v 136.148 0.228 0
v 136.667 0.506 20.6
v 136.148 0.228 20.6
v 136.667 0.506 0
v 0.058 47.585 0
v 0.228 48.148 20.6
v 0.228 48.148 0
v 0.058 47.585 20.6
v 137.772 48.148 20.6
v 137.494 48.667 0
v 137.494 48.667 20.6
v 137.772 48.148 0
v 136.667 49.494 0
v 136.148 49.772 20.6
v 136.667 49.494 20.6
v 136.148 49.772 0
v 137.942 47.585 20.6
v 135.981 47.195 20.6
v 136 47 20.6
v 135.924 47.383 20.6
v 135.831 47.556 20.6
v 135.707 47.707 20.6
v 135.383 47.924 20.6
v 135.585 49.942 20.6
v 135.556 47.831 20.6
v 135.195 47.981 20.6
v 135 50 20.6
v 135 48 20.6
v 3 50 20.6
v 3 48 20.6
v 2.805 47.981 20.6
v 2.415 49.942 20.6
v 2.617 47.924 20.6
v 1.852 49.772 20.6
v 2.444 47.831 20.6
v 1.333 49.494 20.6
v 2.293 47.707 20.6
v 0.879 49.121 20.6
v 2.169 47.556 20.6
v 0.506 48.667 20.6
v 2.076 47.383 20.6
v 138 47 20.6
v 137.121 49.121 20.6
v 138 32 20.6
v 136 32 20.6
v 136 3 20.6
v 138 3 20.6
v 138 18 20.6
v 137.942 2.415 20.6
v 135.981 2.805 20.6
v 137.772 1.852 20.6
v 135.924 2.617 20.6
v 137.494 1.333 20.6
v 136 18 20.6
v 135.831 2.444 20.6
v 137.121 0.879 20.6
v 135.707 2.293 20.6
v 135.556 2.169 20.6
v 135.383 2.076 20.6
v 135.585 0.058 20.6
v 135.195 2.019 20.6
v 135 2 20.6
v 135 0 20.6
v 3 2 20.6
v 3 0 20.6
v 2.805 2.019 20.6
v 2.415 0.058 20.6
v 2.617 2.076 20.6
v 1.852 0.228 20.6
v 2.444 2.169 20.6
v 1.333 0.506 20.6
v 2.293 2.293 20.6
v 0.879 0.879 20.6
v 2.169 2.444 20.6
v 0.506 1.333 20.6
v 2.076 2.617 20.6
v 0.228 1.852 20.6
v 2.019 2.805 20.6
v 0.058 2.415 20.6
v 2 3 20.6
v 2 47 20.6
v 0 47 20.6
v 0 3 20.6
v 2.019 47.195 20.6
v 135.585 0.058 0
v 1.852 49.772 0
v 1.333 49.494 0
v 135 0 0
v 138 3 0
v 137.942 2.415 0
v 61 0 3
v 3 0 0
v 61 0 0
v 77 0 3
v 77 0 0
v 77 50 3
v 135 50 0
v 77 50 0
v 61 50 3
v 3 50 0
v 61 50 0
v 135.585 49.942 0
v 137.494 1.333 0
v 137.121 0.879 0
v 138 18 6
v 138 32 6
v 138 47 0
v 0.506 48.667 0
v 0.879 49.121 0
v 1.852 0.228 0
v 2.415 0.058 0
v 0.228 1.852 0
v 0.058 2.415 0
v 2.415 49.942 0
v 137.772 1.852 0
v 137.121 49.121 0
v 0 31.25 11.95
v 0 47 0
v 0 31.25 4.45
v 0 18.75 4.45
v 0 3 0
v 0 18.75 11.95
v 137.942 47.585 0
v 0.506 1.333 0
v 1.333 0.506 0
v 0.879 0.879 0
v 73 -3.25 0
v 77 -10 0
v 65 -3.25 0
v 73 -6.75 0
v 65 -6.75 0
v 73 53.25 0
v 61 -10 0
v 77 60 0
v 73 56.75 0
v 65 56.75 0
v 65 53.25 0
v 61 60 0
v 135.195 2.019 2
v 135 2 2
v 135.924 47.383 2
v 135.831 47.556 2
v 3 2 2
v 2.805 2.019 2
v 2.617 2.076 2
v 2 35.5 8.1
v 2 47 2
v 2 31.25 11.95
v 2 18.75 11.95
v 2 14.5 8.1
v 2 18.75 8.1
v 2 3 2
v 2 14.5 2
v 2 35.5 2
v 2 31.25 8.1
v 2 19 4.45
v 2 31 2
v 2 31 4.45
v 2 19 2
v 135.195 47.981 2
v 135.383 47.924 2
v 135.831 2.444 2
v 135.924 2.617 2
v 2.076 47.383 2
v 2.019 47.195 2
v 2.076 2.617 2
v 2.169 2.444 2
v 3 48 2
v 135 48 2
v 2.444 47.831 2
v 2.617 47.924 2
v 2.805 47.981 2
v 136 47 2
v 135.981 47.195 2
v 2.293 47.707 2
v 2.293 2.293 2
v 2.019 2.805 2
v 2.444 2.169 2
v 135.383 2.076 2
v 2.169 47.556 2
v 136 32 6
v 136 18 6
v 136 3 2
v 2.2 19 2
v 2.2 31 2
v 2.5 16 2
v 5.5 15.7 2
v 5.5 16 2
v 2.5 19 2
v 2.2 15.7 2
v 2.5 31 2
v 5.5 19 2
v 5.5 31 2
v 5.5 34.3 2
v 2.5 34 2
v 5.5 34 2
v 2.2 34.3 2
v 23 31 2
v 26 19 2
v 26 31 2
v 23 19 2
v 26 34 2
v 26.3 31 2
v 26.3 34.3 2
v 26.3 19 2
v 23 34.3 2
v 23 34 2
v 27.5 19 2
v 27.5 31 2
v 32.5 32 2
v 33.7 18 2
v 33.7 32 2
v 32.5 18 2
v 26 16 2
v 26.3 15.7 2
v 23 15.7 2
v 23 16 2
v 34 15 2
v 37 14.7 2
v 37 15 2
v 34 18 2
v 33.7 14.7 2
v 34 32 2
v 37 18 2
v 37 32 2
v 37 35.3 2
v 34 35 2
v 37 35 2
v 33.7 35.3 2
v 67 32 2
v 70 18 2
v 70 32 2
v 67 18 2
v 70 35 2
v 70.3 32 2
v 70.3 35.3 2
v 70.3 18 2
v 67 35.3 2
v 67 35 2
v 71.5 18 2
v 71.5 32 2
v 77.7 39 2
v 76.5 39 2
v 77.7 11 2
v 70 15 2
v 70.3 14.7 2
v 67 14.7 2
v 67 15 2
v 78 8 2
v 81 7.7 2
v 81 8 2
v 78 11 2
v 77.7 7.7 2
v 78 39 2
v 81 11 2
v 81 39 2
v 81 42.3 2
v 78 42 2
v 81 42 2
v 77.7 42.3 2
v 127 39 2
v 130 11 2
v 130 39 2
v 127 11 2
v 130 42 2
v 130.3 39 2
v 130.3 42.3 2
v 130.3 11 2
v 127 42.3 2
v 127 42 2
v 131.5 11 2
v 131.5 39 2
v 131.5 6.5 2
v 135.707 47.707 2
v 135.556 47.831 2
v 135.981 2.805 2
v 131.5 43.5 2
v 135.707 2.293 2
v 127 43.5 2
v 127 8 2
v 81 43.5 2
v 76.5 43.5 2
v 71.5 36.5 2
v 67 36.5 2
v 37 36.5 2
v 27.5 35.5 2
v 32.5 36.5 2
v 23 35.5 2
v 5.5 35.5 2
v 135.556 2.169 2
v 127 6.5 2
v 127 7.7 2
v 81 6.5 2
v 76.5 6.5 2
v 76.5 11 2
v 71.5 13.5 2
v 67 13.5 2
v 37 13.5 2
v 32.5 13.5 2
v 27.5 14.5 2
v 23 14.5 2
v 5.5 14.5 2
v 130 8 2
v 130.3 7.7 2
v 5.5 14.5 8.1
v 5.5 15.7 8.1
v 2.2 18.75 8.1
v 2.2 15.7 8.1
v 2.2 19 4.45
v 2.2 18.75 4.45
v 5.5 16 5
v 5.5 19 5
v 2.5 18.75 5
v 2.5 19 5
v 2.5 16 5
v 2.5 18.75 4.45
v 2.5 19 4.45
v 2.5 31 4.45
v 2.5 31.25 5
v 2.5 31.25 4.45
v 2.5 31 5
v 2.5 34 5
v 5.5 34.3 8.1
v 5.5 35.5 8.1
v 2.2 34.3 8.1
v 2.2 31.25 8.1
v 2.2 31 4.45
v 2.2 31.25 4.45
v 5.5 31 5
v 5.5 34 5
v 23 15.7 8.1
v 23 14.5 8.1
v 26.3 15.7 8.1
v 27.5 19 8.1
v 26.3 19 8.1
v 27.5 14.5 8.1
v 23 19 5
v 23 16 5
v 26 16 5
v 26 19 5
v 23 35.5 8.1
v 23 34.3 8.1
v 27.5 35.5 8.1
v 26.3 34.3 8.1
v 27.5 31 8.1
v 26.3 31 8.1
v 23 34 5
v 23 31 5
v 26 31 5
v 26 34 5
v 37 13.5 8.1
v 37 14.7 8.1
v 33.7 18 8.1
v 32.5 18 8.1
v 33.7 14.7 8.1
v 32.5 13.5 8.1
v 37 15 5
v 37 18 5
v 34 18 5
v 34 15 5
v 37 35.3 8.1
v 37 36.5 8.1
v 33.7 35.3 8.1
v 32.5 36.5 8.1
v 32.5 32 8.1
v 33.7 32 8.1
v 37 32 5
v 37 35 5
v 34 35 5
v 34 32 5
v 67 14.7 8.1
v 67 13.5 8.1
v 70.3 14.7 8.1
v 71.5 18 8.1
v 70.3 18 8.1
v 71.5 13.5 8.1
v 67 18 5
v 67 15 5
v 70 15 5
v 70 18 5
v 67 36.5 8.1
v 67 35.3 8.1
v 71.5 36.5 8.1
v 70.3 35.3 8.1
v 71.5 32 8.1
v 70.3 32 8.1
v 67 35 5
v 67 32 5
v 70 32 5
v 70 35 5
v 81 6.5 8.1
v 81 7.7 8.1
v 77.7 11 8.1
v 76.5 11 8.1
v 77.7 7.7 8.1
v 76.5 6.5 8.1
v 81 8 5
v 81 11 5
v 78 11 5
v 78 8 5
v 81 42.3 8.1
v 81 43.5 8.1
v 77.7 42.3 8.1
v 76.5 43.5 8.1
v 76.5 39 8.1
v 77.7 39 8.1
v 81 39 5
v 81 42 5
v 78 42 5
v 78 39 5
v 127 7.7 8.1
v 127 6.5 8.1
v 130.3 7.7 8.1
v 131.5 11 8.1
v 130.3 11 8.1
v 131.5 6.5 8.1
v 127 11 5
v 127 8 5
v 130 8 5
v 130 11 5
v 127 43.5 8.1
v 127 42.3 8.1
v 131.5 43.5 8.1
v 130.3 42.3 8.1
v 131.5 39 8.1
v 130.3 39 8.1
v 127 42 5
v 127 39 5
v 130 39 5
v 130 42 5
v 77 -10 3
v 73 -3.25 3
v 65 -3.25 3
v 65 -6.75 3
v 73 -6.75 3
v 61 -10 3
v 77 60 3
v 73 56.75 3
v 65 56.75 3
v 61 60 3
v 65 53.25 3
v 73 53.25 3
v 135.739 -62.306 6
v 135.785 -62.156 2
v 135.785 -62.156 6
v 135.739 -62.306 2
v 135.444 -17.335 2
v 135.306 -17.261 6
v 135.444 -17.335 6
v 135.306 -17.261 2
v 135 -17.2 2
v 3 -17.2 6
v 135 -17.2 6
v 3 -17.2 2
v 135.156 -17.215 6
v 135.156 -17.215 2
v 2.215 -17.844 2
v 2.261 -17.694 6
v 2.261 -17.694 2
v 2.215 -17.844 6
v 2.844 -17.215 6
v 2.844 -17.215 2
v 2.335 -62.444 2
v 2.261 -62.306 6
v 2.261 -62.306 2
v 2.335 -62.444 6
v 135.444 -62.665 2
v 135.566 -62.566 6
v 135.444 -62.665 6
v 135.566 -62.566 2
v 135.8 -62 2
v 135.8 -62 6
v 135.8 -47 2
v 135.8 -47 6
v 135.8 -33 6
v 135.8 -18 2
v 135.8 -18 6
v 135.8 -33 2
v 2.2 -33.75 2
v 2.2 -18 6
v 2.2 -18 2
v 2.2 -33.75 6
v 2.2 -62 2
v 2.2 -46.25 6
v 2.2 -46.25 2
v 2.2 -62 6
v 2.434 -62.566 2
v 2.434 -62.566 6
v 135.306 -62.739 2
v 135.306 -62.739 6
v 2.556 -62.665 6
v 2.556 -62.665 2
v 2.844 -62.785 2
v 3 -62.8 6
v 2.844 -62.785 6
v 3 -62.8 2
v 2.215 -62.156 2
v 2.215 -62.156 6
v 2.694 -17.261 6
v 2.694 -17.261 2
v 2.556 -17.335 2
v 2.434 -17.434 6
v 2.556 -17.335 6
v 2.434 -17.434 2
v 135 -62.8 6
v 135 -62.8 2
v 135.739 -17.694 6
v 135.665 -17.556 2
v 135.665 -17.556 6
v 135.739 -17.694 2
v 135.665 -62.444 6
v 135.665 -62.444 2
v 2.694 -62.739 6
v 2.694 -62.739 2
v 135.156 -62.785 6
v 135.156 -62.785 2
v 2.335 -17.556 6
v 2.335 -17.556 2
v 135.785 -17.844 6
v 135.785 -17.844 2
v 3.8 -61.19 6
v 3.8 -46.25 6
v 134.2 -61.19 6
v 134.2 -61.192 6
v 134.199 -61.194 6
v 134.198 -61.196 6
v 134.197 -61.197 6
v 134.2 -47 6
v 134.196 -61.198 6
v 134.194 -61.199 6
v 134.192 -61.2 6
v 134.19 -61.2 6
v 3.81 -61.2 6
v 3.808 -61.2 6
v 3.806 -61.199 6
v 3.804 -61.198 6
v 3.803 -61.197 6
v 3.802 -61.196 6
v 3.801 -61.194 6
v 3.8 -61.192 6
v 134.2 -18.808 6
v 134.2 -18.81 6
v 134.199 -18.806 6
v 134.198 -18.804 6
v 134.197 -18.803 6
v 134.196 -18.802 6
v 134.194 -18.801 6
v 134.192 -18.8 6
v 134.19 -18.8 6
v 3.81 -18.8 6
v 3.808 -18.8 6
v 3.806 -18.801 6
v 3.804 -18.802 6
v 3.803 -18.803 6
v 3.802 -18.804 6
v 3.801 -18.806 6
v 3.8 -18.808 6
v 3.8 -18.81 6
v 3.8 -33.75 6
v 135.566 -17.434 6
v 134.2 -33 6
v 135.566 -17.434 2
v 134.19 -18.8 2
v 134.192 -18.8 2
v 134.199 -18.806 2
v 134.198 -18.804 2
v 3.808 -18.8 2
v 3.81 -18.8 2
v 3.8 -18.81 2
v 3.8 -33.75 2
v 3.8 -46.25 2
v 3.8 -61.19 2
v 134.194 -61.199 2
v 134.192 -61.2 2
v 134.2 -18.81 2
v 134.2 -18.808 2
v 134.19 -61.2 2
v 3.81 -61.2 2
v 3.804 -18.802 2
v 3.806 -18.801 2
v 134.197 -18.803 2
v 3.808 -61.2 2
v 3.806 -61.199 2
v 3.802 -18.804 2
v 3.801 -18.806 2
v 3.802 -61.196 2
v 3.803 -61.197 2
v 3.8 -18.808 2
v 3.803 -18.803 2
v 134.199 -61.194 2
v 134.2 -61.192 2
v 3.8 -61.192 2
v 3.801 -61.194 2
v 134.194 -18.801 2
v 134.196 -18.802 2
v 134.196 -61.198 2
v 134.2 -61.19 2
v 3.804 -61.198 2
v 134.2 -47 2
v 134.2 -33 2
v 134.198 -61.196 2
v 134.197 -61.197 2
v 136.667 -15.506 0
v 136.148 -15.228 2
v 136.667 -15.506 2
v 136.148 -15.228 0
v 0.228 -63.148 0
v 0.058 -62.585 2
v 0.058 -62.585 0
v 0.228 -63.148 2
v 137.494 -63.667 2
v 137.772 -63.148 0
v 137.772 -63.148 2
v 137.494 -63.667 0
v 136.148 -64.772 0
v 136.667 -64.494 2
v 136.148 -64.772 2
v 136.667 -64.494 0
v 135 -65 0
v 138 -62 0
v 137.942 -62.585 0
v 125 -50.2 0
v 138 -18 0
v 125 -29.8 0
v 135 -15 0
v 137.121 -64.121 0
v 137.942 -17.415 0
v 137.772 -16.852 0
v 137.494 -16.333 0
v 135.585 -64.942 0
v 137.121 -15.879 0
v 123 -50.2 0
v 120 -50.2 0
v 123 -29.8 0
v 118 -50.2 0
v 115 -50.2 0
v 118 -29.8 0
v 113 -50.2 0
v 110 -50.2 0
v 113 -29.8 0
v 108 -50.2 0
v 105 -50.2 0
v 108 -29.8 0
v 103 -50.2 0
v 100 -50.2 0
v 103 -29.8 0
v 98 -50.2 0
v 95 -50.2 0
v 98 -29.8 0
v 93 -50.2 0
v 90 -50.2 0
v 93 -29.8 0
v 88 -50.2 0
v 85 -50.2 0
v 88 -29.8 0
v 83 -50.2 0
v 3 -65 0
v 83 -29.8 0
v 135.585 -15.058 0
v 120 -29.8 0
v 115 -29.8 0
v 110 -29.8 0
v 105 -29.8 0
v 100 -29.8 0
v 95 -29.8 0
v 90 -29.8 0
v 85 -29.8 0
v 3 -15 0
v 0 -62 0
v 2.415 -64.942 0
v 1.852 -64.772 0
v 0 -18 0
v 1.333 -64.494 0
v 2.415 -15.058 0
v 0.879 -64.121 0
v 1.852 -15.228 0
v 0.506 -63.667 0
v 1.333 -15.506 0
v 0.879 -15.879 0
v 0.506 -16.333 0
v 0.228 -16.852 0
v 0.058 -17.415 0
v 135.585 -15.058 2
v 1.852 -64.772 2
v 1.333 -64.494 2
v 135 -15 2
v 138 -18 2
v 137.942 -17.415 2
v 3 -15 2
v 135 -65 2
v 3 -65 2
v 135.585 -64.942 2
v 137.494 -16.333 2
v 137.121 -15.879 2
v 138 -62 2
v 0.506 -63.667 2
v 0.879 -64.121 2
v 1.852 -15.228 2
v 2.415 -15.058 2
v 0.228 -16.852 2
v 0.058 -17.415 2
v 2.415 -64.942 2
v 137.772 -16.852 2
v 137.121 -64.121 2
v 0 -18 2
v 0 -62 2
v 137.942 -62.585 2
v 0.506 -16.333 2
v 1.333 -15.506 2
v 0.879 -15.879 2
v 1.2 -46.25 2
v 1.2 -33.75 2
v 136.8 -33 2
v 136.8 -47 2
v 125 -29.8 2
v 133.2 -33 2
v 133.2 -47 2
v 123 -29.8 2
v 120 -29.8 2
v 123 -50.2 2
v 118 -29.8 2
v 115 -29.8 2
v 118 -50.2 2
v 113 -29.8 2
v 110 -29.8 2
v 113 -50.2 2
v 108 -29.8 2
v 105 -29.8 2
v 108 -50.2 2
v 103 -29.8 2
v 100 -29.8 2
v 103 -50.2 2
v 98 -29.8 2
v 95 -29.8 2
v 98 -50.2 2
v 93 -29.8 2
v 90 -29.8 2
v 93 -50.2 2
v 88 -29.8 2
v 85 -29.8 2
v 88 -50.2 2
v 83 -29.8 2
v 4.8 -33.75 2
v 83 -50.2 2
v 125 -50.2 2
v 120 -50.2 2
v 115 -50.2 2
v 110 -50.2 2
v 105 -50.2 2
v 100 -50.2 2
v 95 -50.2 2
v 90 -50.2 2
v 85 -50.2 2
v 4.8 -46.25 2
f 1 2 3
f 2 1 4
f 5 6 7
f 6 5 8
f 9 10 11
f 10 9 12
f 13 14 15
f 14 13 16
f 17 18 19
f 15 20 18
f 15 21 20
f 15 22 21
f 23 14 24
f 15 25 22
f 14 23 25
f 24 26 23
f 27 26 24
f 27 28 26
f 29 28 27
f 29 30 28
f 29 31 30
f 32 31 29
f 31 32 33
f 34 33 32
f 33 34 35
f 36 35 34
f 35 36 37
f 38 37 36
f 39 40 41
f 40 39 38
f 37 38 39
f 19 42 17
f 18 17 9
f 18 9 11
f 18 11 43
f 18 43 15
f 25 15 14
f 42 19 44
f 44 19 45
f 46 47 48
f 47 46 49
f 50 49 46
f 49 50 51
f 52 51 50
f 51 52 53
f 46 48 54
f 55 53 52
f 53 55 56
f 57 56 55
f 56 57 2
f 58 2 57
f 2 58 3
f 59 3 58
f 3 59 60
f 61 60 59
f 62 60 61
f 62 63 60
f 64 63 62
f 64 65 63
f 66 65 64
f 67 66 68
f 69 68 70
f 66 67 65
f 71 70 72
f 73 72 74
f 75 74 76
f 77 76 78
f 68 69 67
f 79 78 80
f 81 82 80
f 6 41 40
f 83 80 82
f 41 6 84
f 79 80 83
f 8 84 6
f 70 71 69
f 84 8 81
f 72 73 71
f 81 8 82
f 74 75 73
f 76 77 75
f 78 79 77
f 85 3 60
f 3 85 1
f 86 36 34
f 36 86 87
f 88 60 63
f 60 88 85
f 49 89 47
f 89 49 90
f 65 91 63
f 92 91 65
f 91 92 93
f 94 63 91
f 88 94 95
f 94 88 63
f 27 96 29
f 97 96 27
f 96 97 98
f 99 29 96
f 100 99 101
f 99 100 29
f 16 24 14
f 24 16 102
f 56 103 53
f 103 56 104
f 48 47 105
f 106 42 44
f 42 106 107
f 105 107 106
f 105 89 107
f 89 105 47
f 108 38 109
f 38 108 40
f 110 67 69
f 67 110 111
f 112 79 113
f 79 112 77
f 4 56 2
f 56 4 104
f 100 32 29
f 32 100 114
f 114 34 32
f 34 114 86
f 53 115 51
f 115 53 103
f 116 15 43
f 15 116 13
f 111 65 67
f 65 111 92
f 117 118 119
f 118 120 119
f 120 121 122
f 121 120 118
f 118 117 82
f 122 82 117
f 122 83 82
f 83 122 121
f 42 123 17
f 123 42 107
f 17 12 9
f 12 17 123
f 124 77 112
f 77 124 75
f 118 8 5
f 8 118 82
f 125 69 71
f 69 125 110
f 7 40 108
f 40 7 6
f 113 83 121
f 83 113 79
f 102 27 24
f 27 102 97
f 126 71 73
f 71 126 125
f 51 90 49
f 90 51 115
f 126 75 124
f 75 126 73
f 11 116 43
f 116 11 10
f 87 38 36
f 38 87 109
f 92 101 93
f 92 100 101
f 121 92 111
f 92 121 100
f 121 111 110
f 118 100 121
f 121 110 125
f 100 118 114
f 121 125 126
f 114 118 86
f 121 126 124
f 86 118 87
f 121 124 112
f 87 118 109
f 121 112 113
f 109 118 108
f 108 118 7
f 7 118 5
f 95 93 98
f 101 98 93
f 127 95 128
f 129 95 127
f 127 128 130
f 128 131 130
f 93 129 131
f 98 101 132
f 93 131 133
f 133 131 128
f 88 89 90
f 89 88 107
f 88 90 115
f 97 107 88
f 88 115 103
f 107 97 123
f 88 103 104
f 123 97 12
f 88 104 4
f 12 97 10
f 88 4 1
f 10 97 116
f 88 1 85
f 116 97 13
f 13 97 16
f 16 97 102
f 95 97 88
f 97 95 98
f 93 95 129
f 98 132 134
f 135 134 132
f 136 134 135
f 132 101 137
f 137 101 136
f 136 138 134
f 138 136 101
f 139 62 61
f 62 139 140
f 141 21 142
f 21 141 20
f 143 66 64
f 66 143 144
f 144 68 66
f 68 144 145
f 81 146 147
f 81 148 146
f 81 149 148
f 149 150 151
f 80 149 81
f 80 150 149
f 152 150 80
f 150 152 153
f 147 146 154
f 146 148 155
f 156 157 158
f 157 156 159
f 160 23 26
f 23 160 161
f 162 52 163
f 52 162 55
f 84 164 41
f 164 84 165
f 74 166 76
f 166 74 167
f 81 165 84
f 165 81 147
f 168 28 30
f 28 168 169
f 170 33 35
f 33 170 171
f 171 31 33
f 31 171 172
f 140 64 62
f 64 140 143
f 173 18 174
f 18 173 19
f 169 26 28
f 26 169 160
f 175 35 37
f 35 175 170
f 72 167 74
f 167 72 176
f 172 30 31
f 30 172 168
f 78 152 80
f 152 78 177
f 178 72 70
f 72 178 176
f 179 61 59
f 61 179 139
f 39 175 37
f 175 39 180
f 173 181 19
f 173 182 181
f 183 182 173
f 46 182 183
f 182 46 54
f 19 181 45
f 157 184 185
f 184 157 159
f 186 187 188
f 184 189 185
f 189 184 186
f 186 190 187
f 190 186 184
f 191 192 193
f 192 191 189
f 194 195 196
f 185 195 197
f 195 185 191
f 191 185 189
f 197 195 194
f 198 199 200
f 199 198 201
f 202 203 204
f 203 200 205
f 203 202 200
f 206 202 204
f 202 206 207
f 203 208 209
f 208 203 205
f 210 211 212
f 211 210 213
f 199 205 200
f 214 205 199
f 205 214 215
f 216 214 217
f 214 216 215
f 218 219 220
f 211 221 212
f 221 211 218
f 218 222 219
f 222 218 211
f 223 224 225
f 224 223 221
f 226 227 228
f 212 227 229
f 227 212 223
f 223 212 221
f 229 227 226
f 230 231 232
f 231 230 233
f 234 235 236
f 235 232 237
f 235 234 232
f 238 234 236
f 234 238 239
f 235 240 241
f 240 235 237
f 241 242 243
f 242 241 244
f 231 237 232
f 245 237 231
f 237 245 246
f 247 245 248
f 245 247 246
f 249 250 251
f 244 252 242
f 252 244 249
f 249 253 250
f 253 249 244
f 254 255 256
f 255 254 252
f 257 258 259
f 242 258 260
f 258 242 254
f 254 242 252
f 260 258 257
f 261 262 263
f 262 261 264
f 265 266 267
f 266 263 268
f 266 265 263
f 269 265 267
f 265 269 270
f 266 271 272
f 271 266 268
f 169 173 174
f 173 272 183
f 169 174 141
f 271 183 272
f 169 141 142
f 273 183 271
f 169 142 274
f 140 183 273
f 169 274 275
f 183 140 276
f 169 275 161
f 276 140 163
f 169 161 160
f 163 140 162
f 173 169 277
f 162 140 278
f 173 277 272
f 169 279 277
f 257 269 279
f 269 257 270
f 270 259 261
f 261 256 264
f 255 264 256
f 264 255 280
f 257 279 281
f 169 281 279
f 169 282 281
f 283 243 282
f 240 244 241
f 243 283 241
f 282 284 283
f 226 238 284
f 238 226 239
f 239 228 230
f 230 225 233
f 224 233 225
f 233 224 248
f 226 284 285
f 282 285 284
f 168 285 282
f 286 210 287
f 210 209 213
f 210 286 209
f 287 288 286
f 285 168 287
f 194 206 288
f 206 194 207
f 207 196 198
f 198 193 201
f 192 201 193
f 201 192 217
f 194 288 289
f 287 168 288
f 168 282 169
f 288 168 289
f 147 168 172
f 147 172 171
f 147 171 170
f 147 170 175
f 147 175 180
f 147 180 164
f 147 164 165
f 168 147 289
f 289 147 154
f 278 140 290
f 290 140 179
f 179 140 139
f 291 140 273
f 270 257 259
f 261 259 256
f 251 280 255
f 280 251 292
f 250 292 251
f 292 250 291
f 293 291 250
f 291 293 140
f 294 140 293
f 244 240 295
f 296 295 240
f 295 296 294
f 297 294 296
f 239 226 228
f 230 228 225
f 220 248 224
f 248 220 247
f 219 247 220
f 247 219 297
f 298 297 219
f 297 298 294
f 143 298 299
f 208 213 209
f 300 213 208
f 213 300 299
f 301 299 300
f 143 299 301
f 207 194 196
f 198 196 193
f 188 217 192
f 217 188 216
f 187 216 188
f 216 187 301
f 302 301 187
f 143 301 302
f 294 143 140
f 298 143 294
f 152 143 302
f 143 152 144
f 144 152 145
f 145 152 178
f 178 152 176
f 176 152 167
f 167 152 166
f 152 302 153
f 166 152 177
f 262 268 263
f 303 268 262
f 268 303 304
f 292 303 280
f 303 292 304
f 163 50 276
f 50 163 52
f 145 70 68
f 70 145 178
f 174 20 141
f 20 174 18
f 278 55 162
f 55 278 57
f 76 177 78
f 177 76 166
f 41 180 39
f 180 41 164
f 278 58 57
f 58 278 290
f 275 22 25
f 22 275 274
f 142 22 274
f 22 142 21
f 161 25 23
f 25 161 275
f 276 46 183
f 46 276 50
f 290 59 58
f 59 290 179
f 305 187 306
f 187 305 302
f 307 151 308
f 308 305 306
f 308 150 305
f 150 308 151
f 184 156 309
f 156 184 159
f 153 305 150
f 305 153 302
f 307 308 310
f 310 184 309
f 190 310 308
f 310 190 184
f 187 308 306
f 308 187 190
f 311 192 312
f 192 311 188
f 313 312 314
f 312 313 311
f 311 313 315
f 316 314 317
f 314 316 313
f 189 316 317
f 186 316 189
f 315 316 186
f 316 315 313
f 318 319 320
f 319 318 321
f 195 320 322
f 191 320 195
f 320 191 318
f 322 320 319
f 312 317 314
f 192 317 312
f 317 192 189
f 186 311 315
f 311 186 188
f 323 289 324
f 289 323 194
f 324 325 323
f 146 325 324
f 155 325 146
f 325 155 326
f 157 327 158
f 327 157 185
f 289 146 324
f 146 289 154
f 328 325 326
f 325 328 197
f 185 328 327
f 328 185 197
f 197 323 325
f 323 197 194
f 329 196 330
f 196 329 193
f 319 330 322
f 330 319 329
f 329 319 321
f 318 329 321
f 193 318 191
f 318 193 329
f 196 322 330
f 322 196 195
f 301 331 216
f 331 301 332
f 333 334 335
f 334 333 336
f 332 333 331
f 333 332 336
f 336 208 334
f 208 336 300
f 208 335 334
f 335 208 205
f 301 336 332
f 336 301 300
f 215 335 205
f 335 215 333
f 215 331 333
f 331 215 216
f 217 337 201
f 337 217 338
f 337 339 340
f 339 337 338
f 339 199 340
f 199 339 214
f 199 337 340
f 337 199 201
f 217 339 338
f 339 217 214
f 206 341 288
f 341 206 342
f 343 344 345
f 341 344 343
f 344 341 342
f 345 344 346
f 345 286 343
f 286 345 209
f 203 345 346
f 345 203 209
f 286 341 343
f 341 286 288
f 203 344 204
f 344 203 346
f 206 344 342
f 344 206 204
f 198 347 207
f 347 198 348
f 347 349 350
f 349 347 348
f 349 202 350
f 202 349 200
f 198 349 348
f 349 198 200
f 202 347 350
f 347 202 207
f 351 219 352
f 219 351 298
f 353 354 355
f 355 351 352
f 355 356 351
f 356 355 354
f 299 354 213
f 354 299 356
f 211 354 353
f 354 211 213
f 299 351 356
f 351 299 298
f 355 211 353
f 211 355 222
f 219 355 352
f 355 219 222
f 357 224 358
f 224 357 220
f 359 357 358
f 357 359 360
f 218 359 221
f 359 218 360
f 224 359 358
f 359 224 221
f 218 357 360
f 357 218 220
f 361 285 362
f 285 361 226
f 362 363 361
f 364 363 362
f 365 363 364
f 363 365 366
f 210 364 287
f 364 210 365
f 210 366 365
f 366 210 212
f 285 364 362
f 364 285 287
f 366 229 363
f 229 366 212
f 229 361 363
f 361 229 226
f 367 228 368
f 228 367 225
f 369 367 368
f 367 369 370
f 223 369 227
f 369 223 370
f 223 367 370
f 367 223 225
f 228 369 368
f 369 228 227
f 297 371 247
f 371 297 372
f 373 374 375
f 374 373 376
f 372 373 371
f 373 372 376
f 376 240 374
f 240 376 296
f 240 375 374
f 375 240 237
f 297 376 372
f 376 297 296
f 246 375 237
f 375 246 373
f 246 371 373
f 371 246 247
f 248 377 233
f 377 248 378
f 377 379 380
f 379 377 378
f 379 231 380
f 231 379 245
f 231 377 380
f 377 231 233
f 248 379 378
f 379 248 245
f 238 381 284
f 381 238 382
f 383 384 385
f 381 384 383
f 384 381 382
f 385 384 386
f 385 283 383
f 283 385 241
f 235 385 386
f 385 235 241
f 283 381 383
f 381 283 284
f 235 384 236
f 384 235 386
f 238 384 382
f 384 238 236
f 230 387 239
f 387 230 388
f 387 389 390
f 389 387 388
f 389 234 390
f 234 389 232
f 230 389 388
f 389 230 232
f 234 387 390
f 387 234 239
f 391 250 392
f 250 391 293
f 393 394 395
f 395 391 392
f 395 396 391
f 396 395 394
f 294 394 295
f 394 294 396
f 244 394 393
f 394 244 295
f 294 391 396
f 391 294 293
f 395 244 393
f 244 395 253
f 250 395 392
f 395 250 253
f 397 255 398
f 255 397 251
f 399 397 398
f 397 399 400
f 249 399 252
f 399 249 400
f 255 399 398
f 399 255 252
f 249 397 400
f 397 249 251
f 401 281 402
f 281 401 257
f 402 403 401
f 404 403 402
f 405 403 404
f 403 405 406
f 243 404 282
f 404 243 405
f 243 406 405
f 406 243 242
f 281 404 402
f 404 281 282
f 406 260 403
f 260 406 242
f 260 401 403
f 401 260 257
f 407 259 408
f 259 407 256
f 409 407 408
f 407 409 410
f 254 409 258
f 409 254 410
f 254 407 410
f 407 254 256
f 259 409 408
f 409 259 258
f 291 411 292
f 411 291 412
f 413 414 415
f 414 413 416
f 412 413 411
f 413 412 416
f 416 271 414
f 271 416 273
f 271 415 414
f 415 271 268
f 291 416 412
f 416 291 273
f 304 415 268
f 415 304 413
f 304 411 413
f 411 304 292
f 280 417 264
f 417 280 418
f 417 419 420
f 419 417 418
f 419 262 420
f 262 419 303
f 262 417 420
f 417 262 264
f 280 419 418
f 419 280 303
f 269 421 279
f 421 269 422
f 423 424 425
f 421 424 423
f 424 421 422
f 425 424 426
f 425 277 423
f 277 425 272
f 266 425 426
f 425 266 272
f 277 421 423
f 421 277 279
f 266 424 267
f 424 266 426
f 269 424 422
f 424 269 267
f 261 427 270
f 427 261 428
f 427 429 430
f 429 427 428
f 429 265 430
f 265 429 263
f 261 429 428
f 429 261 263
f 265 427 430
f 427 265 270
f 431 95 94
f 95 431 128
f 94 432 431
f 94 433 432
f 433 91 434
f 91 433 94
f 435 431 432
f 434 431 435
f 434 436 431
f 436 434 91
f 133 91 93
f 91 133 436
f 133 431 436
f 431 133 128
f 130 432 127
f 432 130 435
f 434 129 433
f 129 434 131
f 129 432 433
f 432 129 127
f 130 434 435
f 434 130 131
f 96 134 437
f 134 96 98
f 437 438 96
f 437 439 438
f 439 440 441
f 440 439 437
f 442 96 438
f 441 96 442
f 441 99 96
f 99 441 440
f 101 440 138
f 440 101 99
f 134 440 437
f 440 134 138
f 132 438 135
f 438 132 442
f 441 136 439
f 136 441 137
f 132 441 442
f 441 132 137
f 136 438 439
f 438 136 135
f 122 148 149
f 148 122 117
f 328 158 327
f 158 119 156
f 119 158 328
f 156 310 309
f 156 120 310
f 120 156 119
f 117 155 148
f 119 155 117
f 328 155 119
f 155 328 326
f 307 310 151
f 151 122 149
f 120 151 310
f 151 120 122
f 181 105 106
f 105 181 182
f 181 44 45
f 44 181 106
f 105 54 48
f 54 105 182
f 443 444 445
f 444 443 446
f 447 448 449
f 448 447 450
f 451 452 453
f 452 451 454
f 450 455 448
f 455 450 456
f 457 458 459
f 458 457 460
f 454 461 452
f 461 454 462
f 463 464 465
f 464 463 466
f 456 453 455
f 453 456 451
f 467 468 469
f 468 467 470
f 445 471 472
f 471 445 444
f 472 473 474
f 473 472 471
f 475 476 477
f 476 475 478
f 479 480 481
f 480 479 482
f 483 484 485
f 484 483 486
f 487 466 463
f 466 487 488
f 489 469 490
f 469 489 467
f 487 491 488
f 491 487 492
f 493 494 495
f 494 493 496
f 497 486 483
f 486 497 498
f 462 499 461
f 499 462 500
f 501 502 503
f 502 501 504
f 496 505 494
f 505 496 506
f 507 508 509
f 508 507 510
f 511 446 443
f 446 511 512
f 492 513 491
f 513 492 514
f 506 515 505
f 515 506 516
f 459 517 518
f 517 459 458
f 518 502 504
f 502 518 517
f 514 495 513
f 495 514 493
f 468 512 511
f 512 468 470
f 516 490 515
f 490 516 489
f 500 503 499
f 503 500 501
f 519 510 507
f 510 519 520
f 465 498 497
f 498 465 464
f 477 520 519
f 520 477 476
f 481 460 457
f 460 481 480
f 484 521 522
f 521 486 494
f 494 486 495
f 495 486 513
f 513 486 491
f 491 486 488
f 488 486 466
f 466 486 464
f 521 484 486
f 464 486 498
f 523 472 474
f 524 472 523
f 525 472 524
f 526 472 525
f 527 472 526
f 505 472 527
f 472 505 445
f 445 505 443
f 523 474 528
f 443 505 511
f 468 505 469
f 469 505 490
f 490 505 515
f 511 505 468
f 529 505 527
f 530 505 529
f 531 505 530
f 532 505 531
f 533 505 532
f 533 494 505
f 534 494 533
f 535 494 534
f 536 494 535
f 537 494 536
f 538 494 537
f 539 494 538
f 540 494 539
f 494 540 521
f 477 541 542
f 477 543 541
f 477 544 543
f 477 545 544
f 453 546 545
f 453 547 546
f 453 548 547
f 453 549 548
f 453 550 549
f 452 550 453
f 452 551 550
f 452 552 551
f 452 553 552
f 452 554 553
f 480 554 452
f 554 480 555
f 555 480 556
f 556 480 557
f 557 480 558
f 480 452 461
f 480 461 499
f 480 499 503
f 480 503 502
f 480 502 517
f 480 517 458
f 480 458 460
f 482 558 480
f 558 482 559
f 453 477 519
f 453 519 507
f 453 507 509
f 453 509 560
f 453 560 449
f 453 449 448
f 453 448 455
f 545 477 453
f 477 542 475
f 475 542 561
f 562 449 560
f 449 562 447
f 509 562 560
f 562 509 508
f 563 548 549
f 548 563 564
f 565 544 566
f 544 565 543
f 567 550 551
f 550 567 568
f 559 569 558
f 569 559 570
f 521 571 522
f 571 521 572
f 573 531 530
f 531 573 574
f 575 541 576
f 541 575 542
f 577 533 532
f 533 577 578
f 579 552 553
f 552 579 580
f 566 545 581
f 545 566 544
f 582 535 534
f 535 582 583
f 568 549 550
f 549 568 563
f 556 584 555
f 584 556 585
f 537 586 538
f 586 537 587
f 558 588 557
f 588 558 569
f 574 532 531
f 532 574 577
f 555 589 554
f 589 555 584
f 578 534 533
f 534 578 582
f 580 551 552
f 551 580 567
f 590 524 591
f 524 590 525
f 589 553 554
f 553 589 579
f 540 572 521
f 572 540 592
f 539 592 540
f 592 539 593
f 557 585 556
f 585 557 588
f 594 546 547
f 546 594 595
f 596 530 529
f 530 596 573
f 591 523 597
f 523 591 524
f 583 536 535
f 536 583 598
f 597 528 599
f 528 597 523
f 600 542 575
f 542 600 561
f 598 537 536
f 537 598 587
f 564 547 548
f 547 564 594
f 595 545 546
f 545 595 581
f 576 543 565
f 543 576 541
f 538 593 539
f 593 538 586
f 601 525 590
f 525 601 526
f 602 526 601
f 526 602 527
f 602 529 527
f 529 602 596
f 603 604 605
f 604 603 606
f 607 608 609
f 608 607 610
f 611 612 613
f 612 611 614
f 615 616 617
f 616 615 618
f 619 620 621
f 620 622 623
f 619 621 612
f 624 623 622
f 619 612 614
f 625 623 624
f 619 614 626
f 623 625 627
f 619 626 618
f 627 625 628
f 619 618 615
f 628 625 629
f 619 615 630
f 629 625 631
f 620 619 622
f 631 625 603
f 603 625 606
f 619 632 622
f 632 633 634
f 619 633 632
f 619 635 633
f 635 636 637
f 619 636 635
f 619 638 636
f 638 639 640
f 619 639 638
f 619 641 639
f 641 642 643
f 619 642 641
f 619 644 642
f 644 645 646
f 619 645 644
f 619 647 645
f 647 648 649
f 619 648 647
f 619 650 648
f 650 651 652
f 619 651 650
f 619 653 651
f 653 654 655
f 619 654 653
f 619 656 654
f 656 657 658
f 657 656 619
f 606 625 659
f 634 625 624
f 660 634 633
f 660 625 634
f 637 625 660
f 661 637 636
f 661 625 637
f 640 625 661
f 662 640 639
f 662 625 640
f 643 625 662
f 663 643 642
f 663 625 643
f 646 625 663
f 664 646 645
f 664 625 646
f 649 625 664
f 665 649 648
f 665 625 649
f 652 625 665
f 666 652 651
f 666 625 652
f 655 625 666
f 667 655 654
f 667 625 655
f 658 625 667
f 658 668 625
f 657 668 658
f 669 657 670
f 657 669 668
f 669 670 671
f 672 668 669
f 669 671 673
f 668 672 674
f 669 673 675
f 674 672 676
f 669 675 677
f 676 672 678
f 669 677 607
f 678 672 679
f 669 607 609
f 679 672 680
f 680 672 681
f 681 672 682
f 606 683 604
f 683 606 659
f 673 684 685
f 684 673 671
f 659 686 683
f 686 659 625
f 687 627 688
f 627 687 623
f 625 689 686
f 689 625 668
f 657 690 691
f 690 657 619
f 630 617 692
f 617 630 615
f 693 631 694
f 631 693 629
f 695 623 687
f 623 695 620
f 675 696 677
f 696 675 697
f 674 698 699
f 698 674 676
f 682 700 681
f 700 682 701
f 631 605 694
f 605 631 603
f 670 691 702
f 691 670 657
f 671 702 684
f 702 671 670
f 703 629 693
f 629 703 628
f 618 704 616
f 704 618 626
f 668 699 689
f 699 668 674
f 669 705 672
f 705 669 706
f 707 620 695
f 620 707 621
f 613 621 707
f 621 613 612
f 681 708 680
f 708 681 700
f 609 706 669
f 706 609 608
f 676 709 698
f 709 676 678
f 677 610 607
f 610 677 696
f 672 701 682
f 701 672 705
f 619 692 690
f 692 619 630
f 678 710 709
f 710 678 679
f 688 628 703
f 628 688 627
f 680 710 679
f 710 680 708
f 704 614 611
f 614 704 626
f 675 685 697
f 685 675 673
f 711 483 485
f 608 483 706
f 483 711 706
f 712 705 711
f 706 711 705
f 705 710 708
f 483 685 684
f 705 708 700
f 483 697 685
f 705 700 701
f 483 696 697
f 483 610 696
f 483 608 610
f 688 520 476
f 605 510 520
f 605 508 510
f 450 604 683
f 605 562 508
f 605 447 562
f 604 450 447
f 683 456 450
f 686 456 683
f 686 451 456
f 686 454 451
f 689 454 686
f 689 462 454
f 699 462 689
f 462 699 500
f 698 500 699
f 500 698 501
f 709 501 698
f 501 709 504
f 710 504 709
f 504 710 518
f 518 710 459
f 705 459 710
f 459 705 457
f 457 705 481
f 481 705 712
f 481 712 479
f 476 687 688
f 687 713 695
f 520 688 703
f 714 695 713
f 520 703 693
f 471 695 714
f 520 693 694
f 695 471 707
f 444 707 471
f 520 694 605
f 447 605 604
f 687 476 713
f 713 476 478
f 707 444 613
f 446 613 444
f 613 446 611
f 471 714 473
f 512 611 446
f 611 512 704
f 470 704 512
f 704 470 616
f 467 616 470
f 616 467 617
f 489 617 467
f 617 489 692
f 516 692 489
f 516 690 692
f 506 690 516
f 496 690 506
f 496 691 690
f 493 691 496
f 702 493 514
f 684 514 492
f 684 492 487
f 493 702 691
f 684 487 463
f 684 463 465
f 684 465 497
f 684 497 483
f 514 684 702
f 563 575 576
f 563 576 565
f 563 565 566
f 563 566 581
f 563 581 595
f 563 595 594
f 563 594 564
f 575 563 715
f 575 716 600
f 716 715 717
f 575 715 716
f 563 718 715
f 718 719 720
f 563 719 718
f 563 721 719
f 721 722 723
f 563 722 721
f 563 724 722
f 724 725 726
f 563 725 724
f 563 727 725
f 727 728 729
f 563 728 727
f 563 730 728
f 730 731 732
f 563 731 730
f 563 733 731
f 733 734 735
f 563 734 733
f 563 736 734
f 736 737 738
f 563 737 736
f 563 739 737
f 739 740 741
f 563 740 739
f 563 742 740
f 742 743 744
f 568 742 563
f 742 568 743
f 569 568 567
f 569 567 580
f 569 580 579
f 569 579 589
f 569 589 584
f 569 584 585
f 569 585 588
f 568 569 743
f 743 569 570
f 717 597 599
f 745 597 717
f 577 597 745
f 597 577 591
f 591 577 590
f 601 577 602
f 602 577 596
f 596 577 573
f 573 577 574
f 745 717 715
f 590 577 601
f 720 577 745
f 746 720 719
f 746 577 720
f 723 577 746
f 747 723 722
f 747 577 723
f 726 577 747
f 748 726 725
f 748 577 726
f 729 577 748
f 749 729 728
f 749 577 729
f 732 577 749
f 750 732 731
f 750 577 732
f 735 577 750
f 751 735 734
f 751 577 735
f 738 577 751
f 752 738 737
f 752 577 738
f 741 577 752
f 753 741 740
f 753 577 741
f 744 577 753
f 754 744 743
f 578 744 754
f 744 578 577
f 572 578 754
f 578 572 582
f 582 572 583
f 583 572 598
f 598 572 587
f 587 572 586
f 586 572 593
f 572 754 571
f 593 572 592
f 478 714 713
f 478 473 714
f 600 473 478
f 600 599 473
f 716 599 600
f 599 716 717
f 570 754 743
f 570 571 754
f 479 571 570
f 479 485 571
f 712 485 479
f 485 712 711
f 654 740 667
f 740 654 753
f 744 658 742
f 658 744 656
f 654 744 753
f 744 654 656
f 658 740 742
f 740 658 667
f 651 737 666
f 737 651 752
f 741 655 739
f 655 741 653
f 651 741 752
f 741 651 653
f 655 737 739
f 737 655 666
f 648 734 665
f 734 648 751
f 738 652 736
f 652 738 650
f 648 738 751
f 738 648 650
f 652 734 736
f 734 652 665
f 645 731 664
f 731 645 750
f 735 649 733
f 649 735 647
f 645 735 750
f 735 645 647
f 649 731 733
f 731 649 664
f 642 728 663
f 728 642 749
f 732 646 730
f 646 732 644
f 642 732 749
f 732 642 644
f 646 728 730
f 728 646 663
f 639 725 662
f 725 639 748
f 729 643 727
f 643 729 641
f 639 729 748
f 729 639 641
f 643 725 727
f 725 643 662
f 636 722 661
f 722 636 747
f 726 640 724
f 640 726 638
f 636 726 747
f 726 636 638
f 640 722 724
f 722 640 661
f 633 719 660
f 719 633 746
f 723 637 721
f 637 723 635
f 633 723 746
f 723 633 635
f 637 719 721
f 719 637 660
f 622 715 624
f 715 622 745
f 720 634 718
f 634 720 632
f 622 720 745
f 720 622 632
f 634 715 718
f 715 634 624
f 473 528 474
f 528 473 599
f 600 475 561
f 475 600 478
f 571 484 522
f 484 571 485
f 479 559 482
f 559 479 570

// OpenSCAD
// Spark fan controller box
// Parametric enclosure for the hyudryu DGX-Spark-Fan-Shroud controller:
// RP2040-Zero + X9C103 module + Owltree PC039b USB-C PWM fan controller.
//
// Layout: the three boards sit in a row on corner locating brackets.
//   -X wall: RP2040-Zero USB-C opening (the one cable to the Spark)
//   +X wall: U-notch for the fan lead, open at the top so the plug drops in
//   lid:     friction-fit lip, vent slots over the Owltree boost converter
//   +/-Y:    zip-tie ears for strapping to the shroud leg or base
//
// Check every value marked MEASURE with calipers before printing.
// Units: mm. X runs along the row of boards, Y across, Z up.
// Hold boards in their brackets with a dab of hot glue or foam tape.

/* [Output] */
part = "print"; // [print, base, lid, assembled]

/* [Board footprints: L along X, W along Y] */
rp_L = 23.5;    // RP2040-Zero (Waveshare datasheet)
rp_W = 18.0;
x9_L = 36.0;    // X9C103 module                          MEASURE
x9_W = 20.0;    //                                        MEASURE
ow_L = 52.0;    // Owltree PC039b                         MEASURE
ow_W = 34.0;    //                                        MEASURE
pcb_t = 1.6;    // thickest of the three PCBs             MEASURE

/* [Clearance below each board: pins, solder tails] */
rp_under = 3;   // raise to ~9 if headers point down
x9_under = 3;   //                                        MEASURE
ow_under = 3;   //                                        MEASURE

/* [Tallest part above each board, incl. plugs and jumpers] */
rp_above = 12;  // Dupont housings ~12; ~4 if wires are soldered
x9_above = 12;
ow_above = 14;  // fan plug seated in its header          MEASURE

/* [Spacing] */
board_gap = 8;  // between boards along X, for wiring
side_gap  = 6;  // each side along Y, for wiring
end_gap   = 6;  // Owltree to the +X wall

/* [RP2040-Zero USB-C opening, -X wall] */
usb_w  = 12.5;  // fits a typical USB-C plug overmold
usb_h  = 7.5;
usb_zc = 1.6;   // connector centre above the PCB top     MEASURE
usb_y  = 9.0;   // connector centre from the board's -Y edge

/* [Fan lead notch, +X wall] */
fan_w = 14;
fan_y = 17;     // notch centre from the Owltree's -Y edge MEASURE
fan_z = 4;      // notch floor above the box floor

/* [Optional Owltree USB-C opening, -Y wall (two-cable wiring)] */
ow_usb_cut = false;
ow_usb_x   = 26;  // from the Owltree's -X edge           MEASURE
ow_usb_zc  = 1.6; // connector centre above the PCB top   MEASURE

/* [Lid] */
vents = true;
display_window = false; // over the Owltree's speed display
disp_x = 10;    // window corner from the Owltree's -X/-Y corner MEASURE
disp_y = 8;
disp_w = 20;
disp_h = 10;

/* [Shell] */
wall      = 2.0;
floor_t   = 2.0;
lid_t     = 2.0;
corner_r  = 3.0;
lip_h     = 4.0;  // lid lip depth
lip_t     = 1.6;
lid_fit   = 0.2;  // lid lip clearance per side
board_fit = 0.3;  // board clearance inside its brackets
pad       = 3.0;  // support pad under each board corner
brk_t     = 1.2;  // bracket wall thickness
brk_rise  = 1.5;  // bracket height above the PCB top

/* [Mounting ears] */
ears   = true;
ear_len = 10;
ear_w   = 16;
ear_t   = 3;
slot_l  = 8;
slot_w  = 3.5;

/* [Hidden] */
$fn = 32;
usb_gap = 0.5;  // RP2040 USB edge to the -X wall

inner_L = usb_gap + rp_L + board_gap + x9_L + board_gap + ow_L + end_gap;
inner_W = max(rp_W, x9_W, ow_W) + 2 * side_gap;
inner_H = max(rp_under + rp_above, x9_under + x9_above, ow_under + ow_above) + pcb_t;

outer_L = inner_L + 2 * wall;
outer_W = inner_W + 2 * wall;
base_H  = floor_t + inner_H;

// Board origins: the -X/-Y corner of each PCB, in box coordinates.
function centred_y(W) = wall + (inner_W - W) / 2;

rp_x = wall + usb_gap;
x9_x = rp_x + rp_L + board_gap;
ow_x = x9_x + x9_L + board_gap;
rp_y = centred_y(rp_W);
x9_y = centred_y(x9_W);
ow_y = ow_usb_cut ? wall + usb_gap : centred_y(ow_W);


// ---------------------------------------------------------------------
// Primitives
// ---------------------------------------------------------------------

module rrect(L, W, h, r) {
    linear_extrude(h) offset(r) offset(-r) square([L, W]);
}

// One corner bracket for a board corner at the origin, board toward +X/+Y.
module corner_bracket(under) {
    h = under + pcb_t + brk_rise;
    o = board_fit + brk_t;
    cube([pad, pad, under]);                          // support pad
    difference() {                                    // L-shaped locator
        translate([-o, -o, 0]) cube([pad + o, pad + o, h]);
        translate([-board_fit, -board_fit, -1]) cube([pad + o, pad + o, h + 2]);
    }
}

module brackets(x, y, L, W, under) {
    for (cx = [0, 1], cy = [0, 1])
        translate([x + cx * L, y + cy * W, floor_t])
            scale([cx == 1 ? -1 : 1, cy == 1 ? -1 : 1, 1])
                corner_bracket(under);
}

// Zip-tie ear protruding toward -Y from a wall at y = 0.
module ear() {
    translate([-ear_w / 2, -ear_len, 0])
        difference() {
            cube([ear_w, ear_len + 0.5, ear_t]);
            translate([(ear_w - slot_l) / 2, (ear_len - slot_w) / 2, -1])
                cube([slot_l, slot_w, ear_t + 2]);
        }
}


// ---------------------------------------------------------------------
// Base
// ---------------------------------------------------------------------

module shell() {
    difference() {
        rrect(outer_L, outer_W, base_H, corner_r);
        translate([wall, wall, floor_t])
            rrect(inner_L, inner_W, base_H, max(corner_r - wall, 0.01));
    }
}

module cutouts() {
    // RP2040-Zero USB-C, -X wall
    usb_z = floor_t + rp_under + pcb_t + usb_zc;
    translate([-1, rp_y + usb_y - usb_w / 2, usb_z - usb_h / 2])
        cube([wall + usb_gap + 1, usb_w, usb_h]);

    // Fan lead U-notch, +X wall, open at the top
    translate([outer_L - wall - 1, ow_y + fan_y - fan_w / 2, floor_t + fan_z])
        cube([wall + 2, fan_w, base_H]);

    // Optional Owltree USB-C, -Y wall
    if (ow_usb_cut) {
        z = floor_t + ow_under + pcb_t + ow_usb_zc;
        translate([ow_x + ow_usb_x - usb_w / 2, -1, z - usb_h / 2])
            cube([usb_w, wall + usb_gap + 1, usb_h]);
    }
}

module base() {
    difference() {
        union() {
            shell();
            brackets(rp_x, rp_y, rp_L, rp_W, rp_under);
            brackets(x9_x, x9_y, x9_L, x9_W, x9_under);
            brackets(ow_x, ow_y, ow_L, ow_W, ow_under);
            if (ears) {
                translate([outer_L / 2, 0, 0]) ear();
                translate([outer_L / 2, outer_W, 0]) mirror([0, 1, 0]) ear();
            }
        }
        cutouts();
    }
}


// ---------------------------------------------------------------------
// Lid (modelled in place on top of the base)
// ---------------------------------------------------------------------

module lid_assembled() {
    r_in = max(corner_r - wall - lid_fit, 0.01);
    lip_L = inner_L - 2 * lid_fit;
    lip_W = inner_W - 2 * lid_fit;

    difference() {
        union() {
            translate([0, 0, base_H]) rrect(outer_L, outer_W, lid_t, corner_r);
            translate([wall + lid_fit, wall + lid_fit, base_H - lip_h])
                difference() {
                    rrect(lip_L, lip_W, lip_h + 0.01, r_in);
                    translate([lip_t, lip_t, -1])
                        rrect(lip_L - 2 * lip_t, lip_W - 2 * lip_t, lip_h + 2,
                              max(r_in - lip_t, 0.01));
                }
        }

        // Keep the fan notch and USB opening clear of the lip
        translate([outer_L - wall - lid_fit - lip_t - 1, ow_y + fan_y - fan_w / 2,
                   base_H - lip_h - 1])
            cube([lip_t + 2, fan_w, lip_h + 1]);
        translate([wall + lid_fit - 1, rp_y + usb_y - usb_w / 2, base_H - lip_h - 1])
            cube([lip_t + 2, usb_w, lip_h + 1]);

        if (vents)
            for (i = [0 : floor((ow_L - 10) / 5)])
                translate([ow_x + 5 + i * 5, ow_y + ow_W * 0.2, base_H - 1])
                    cube([2, ow_W * 0.6, lid_t + 2]);

        if (display_window)
            translate([ow_x + disp_x, ow_y + disp_y, base_H - 1])
                cube([disp_w, disp_h, lid_t + 2]);
    }
}

// Flipped plate-down for printing.
module lid_print() {
    rotate([180, 0, 0]) translate([0, 0, -(base_H + lid_t)]) lid_assembled();
}

// Ghost boards for the assembled preview.
module boards() {
    color("ForestGreen") translate([rp_x, rp_y, floor_t + rp_under]) cube([rp_L, rp_W, pcb_t]);
    color("RoyalBlue")   translate([x9_x, x9_y, floor_t + x9_under]) cube([x9_L, x9_W, pcb_t]);
    color("DimGray")     translate([ow_x, ow_y, floor_t + ow_under]) cube([ow_L, ow_W, pcb_t]);
}


// ---------------------------------------------------------------------
// Output
// ---------------------------------------------------------------------

echo(str("Outer size: ", outer_L, " x ", outer_W, " x ", base_H + lid_t, " mm"));

if (part == "base") {
    base();
} else if (part == "lid") {
    lid_print();
} else if (part == "assembled") {
    base();
    boards();
    color("LightSteelBlue", 0.45) lid_assembled();
} else {
    base();
    translate([0, -(ear_len + 5), 0]) lid_print();
}
